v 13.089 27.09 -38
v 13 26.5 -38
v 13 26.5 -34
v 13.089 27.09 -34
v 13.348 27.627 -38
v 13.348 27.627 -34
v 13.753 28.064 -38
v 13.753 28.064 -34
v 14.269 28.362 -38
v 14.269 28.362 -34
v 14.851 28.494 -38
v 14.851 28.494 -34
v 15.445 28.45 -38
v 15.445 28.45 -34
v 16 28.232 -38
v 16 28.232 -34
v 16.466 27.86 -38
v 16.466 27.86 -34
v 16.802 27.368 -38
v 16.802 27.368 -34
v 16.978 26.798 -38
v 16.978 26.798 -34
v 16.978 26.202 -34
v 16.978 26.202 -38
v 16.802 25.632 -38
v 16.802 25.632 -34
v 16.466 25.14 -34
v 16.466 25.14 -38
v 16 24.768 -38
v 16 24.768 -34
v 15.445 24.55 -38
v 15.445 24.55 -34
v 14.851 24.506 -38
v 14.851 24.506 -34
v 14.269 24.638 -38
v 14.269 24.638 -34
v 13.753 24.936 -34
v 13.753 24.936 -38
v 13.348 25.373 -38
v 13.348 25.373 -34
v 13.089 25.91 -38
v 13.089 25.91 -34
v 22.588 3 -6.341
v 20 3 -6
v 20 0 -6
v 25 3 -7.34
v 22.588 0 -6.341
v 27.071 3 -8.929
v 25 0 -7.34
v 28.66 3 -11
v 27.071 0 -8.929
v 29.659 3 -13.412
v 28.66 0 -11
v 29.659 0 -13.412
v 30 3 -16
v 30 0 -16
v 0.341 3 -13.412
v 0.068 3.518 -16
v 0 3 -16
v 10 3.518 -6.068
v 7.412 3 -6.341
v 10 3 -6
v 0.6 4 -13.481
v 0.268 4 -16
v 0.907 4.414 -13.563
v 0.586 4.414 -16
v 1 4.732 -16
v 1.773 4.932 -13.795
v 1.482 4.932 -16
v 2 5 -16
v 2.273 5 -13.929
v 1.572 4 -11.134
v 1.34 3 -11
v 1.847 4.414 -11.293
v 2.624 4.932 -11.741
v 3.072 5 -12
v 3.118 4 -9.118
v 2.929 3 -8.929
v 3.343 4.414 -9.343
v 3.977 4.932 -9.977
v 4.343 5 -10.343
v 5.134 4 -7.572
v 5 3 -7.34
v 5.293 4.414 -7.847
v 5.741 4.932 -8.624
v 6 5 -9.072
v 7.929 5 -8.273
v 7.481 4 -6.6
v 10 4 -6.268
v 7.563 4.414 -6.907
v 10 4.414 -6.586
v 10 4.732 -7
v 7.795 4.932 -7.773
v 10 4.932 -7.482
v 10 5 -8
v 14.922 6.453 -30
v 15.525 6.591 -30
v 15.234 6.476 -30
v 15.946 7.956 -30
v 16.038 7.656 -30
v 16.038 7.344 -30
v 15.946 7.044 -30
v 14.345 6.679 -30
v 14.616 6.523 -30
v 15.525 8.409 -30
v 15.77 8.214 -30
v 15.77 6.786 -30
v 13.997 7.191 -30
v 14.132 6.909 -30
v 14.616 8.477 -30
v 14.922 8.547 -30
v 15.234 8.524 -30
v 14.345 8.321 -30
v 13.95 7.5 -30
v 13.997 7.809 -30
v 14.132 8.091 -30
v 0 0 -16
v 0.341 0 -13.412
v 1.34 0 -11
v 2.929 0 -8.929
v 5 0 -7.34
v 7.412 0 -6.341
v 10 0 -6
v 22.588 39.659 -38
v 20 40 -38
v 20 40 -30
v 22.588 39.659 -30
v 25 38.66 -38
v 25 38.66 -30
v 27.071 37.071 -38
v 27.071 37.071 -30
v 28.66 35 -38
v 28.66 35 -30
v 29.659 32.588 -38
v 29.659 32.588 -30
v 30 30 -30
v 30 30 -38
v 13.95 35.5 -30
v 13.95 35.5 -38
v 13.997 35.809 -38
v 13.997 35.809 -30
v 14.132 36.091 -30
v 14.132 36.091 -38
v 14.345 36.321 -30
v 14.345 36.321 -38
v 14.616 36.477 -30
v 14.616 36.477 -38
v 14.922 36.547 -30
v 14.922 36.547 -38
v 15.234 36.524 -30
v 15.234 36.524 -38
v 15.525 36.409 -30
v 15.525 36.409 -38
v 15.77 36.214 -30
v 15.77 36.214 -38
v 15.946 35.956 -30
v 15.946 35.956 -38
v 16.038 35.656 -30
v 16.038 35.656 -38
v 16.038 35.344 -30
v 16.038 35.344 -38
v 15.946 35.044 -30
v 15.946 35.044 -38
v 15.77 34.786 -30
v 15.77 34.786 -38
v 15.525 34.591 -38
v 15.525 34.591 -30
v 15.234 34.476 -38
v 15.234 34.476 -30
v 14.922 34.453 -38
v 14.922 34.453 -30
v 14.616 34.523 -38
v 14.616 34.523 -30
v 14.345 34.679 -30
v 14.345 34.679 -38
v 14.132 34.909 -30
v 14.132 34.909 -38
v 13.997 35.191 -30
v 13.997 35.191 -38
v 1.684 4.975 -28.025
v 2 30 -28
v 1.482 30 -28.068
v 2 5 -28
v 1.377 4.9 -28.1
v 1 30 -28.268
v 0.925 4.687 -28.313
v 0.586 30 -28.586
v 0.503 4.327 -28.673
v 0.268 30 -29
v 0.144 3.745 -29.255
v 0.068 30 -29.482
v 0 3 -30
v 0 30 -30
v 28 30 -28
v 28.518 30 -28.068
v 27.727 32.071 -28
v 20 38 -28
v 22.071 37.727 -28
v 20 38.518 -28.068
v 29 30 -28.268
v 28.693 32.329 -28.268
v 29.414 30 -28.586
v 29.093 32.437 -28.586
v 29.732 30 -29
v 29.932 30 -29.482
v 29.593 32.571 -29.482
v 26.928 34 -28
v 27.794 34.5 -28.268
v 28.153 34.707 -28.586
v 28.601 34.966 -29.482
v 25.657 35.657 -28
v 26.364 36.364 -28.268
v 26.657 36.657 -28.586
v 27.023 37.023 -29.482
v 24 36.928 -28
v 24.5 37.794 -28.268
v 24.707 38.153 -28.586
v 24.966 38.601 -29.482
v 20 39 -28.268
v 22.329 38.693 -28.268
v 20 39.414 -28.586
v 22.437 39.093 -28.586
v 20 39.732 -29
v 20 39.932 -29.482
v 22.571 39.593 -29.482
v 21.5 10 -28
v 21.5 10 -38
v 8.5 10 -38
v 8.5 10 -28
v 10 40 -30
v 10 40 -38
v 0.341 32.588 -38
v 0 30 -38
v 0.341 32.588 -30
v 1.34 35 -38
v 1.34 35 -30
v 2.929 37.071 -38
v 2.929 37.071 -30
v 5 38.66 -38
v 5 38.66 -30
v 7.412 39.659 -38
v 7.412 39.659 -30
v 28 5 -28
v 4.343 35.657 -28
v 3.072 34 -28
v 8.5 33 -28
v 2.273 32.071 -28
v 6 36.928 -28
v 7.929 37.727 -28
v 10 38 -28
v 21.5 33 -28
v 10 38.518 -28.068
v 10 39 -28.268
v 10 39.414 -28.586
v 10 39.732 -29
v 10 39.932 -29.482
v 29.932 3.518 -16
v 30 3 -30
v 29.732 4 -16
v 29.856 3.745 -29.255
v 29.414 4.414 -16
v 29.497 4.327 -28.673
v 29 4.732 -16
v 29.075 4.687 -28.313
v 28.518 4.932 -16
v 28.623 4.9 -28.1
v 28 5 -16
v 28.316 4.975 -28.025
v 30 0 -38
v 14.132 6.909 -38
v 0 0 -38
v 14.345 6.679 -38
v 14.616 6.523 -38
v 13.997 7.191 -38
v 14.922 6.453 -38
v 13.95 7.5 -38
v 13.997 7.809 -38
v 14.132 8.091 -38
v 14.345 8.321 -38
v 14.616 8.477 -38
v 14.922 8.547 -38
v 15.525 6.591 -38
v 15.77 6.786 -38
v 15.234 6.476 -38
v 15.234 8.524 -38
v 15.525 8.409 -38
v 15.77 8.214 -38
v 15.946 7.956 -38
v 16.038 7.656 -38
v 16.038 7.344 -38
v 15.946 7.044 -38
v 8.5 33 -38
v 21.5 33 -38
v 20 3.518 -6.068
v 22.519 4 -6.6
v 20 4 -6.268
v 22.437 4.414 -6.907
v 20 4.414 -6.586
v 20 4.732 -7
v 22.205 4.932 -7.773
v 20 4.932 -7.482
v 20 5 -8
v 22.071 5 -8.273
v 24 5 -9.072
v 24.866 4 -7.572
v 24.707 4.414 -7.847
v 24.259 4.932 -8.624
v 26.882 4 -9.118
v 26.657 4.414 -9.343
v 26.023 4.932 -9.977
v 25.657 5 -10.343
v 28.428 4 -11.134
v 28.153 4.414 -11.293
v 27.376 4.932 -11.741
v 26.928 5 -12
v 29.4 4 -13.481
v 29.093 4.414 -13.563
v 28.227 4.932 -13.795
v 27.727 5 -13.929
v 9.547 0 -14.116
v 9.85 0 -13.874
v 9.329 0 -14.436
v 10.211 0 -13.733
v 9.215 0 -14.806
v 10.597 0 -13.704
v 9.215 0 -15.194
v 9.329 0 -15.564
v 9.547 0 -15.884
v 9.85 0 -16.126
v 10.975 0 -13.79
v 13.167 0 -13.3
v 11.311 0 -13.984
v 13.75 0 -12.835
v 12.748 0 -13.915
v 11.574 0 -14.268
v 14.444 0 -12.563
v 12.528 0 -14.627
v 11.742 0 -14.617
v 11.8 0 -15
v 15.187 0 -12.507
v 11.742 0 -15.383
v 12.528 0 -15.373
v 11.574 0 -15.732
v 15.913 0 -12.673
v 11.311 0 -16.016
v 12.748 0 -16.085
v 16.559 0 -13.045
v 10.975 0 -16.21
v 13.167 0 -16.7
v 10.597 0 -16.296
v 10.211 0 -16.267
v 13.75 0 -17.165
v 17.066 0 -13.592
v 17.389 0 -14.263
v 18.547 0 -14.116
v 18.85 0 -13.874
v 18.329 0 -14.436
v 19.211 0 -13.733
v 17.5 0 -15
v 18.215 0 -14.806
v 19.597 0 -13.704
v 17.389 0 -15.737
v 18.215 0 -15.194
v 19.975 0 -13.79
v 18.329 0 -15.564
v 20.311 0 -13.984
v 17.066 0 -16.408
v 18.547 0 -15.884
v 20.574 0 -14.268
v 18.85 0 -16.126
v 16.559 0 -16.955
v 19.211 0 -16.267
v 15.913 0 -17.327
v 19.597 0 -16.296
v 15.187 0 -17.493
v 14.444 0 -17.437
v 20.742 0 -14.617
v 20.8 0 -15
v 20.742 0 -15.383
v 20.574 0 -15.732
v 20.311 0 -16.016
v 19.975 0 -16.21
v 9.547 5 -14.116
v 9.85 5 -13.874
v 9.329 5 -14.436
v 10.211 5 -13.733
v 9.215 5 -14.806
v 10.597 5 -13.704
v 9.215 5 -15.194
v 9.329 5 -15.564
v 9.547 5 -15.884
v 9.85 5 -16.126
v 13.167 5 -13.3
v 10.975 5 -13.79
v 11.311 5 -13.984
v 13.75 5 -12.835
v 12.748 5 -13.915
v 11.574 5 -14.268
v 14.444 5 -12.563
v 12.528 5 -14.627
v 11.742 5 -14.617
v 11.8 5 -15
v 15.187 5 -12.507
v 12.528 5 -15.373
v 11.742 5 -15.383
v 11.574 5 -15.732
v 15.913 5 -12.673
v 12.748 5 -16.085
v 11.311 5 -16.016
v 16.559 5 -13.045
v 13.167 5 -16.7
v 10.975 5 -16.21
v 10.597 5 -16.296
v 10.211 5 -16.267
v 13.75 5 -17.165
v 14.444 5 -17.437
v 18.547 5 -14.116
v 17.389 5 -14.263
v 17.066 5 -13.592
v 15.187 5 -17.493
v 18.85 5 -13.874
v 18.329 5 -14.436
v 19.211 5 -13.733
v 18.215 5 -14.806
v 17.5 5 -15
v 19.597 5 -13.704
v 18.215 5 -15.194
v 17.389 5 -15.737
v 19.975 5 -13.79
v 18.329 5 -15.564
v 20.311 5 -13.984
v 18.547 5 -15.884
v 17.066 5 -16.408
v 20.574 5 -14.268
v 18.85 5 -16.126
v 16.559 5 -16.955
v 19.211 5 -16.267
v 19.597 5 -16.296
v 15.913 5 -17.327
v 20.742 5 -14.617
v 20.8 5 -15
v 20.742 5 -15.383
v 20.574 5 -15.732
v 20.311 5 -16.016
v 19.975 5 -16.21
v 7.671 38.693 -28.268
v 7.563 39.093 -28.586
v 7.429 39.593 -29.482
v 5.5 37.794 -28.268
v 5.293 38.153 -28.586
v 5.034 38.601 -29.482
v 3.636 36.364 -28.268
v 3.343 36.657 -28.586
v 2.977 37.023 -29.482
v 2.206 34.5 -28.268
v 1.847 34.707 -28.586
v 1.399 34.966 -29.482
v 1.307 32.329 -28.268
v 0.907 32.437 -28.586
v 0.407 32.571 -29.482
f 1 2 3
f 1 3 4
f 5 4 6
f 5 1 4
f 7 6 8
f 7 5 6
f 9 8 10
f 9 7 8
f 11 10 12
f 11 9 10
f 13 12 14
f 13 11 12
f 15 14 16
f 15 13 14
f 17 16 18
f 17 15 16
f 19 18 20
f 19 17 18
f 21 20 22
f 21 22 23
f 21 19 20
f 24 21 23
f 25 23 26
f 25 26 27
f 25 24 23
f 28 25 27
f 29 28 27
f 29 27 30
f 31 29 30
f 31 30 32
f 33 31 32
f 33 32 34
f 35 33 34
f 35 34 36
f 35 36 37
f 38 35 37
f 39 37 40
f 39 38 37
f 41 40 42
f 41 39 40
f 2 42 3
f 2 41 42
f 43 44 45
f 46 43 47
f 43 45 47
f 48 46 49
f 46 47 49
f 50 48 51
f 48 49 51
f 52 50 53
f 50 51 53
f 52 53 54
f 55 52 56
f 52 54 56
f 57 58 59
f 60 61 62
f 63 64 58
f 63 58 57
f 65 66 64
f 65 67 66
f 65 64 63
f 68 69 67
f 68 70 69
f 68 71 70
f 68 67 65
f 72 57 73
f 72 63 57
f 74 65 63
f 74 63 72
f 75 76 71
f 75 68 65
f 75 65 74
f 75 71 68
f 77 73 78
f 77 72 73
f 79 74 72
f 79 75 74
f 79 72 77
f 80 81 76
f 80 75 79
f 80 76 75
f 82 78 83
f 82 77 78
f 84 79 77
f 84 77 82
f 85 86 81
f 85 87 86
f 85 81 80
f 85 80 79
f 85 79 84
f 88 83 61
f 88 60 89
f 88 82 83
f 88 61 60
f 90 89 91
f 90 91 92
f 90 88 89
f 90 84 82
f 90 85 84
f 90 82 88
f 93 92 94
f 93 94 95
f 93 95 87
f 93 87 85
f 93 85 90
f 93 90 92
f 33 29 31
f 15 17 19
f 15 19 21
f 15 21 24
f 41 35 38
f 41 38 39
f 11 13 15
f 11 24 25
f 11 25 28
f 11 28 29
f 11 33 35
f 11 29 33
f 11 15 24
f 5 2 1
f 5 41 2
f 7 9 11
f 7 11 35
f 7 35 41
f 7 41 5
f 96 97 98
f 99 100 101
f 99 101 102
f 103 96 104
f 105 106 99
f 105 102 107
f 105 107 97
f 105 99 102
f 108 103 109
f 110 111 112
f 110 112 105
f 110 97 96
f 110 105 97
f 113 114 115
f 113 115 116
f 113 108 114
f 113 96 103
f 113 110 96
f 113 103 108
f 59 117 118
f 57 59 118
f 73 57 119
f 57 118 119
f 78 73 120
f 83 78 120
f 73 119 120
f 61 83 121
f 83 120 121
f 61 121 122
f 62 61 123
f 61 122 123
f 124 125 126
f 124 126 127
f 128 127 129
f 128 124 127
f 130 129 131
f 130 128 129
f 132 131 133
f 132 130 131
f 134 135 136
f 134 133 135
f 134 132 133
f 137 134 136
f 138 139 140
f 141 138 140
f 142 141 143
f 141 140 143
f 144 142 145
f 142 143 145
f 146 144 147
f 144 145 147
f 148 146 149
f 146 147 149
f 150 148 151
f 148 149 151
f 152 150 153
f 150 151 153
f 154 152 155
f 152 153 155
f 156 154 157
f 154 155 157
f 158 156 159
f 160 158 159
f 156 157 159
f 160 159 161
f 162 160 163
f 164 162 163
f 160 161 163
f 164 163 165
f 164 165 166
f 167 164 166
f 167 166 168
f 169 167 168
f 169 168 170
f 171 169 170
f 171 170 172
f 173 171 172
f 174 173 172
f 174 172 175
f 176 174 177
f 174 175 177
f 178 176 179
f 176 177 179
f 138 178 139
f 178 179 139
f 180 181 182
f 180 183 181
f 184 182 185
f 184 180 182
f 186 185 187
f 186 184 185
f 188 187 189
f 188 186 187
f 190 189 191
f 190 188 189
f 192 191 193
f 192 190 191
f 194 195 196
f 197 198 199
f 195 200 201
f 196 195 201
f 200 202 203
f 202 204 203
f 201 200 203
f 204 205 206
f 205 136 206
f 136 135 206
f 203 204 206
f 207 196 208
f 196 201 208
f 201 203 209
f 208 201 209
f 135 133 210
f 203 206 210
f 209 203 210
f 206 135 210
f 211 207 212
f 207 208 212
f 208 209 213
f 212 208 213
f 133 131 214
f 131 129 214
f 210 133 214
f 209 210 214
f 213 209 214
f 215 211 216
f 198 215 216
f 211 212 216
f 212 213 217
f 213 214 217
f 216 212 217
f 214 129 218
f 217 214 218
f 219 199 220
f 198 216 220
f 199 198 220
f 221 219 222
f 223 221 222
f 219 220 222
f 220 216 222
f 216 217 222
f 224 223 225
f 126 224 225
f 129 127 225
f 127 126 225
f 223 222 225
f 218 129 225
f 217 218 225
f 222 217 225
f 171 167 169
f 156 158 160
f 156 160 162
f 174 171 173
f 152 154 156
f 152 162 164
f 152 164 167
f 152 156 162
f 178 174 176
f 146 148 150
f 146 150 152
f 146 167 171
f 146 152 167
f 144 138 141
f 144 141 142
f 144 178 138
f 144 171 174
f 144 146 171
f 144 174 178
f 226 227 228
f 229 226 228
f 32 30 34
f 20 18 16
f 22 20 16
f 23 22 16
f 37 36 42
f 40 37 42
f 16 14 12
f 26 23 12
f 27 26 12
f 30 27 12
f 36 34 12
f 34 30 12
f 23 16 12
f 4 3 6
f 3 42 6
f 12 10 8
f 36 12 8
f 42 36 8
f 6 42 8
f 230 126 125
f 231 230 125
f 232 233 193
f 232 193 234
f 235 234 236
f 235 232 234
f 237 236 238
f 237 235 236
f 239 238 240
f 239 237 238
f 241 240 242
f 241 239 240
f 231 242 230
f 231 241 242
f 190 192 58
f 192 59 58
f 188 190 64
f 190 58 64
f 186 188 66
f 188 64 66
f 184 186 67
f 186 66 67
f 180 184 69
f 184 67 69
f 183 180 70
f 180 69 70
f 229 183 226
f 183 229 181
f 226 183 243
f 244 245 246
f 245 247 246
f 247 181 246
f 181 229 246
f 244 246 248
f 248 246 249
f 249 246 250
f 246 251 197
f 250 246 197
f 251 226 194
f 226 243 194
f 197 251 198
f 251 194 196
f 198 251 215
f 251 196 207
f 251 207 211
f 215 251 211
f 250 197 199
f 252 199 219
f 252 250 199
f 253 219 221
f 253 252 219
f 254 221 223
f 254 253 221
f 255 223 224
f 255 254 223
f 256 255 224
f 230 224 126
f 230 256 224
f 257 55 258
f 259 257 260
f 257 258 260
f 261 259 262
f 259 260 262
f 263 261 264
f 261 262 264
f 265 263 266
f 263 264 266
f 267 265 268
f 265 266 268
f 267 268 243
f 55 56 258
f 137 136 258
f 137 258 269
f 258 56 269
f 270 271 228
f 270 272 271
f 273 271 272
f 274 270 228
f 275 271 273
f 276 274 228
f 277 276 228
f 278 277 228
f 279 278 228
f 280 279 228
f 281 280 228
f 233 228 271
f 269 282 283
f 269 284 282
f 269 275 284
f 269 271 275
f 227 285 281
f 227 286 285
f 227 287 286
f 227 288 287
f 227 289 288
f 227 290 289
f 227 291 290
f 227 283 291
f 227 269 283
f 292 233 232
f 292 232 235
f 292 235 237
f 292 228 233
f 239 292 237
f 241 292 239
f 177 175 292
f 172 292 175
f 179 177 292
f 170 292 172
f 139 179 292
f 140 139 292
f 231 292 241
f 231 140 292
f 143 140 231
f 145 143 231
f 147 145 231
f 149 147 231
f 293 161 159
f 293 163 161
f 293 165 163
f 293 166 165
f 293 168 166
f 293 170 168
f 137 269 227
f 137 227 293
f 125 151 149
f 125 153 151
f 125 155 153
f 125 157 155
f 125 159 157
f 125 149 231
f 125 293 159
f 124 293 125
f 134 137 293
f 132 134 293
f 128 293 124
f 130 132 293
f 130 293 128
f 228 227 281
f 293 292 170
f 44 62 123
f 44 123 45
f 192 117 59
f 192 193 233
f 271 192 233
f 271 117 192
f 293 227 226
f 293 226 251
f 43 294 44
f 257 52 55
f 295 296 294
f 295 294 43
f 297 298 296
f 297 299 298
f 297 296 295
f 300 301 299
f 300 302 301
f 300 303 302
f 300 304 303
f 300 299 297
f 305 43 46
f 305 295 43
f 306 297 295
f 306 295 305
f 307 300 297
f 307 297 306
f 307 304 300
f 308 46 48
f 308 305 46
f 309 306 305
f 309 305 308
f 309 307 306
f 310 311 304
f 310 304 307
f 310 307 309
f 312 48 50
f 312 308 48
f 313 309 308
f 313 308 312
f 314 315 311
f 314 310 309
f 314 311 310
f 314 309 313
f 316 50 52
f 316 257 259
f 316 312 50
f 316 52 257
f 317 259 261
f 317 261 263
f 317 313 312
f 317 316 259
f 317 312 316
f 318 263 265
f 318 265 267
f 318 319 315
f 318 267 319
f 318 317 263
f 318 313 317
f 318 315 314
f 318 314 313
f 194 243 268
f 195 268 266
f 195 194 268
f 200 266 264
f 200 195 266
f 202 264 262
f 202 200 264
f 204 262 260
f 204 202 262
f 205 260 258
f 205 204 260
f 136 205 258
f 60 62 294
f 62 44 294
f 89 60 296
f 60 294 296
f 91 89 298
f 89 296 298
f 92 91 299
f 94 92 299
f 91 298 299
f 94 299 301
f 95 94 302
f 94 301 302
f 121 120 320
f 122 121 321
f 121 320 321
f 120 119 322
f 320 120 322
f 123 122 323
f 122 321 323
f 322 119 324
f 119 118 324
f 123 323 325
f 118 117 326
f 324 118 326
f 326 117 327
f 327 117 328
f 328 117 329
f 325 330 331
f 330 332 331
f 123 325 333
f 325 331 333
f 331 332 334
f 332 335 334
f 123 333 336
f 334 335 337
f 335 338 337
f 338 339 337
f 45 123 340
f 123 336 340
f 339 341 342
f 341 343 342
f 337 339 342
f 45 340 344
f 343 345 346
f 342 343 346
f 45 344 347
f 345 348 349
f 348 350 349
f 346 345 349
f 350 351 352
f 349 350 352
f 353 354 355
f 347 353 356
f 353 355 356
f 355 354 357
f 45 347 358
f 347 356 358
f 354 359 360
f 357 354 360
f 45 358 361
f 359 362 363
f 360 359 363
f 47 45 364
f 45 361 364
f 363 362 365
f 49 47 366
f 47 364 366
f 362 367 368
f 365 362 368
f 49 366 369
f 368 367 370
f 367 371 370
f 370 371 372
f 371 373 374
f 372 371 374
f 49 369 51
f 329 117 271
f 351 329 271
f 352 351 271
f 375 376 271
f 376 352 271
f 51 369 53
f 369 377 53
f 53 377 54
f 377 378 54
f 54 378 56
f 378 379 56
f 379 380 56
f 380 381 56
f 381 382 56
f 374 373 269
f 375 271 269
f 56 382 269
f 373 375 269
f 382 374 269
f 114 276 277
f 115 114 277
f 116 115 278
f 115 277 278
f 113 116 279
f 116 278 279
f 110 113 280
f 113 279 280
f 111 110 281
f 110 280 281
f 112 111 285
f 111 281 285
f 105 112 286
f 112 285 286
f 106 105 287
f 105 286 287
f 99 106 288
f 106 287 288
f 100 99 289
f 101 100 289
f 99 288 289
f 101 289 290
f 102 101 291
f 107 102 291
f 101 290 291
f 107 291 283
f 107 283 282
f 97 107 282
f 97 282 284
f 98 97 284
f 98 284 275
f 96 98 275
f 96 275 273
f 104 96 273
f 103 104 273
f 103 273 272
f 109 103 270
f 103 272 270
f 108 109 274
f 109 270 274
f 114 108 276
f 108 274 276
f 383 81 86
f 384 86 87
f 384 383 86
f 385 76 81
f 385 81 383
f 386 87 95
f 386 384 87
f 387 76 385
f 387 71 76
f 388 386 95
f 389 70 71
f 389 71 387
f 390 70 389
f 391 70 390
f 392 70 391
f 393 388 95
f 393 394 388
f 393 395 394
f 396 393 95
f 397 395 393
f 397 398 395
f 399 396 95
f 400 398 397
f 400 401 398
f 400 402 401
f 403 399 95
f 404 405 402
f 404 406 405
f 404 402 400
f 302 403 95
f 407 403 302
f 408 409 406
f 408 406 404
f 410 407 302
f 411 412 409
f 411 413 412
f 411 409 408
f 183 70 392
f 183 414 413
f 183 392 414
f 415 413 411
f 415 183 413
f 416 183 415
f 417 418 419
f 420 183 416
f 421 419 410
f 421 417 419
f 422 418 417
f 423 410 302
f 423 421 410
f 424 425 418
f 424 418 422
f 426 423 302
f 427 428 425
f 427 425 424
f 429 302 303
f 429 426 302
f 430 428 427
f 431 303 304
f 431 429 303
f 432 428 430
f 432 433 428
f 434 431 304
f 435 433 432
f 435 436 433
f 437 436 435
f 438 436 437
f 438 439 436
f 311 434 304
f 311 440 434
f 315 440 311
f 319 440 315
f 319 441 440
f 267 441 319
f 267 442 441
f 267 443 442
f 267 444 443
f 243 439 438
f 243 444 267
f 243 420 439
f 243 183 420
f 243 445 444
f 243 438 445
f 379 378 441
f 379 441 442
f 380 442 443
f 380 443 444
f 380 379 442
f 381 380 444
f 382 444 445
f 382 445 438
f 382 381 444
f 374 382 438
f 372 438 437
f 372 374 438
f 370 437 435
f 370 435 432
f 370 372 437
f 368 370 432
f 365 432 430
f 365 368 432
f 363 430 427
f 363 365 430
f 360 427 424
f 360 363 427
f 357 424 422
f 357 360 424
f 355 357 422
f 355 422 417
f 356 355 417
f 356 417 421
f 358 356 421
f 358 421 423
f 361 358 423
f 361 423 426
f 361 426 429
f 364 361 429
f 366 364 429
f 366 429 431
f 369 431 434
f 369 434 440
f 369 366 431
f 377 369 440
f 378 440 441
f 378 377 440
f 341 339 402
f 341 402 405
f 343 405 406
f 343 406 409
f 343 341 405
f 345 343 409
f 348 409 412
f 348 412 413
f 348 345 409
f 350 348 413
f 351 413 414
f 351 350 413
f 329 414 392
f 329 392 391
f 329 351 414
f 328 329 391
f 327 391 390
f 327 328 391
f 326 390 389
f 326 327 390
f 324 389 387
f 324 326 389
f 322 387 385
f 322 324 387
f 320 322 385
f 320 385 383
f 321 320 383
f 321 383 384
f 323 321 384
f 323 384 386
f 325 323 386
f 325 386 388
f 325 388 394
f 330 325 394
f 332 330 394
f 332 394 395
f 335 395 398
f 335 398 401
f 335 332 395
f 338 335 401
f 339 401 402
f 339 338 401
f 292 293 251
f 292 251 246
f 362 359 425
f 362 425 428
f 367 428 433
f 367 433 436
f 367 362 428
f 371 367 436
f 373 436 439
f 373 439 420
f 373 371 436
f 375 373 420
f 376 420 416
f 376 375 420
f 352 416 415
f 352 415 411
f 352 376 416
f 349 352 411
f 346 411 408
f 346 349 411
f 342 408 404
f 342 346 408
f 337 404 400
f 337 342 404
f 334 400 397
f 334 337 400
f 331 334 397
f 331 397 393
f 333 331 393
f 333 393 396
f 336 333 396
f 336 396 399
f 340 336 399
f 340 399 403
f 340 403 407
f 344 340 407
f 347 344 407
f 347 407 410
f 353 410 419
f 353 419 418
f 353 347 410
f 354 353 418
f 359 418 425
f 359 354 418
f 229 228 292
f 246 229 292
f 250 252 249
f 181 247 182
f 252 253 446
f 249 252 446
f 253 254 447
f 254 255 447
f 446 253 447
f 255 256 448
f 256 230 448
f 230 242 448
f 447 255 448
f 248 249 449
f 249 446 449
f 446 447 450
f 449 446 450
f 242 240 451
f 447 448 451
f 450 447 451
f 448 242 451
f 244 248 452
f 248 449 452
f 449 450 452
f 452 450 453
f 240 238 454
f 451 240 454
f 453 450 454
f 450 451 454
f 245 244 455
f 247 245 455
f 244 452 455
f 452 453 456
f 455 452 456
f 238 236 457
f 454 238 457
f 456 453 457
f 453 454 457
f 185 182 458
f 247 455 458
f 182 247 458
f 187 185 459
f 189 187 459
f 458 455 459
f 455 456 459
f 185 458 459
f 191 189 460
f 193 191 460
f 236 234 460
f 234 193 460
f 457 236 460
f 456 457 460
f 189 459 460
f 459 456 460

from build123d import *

# Parameters (mm, degrees)
SKETCH1_W           = 30
SKETCH1_H           = 30
SKETCH1_R           = 1.3
SKETCH1_R_2         = 2.5
BOSS_EXTRUDE1_DEPTH = 5
SKETCH2_W           = 10
SKETCH2_H           = 40
BOSS_EXTRUDE2_DEPTH = 30
SKETCH3_W           = 13
SKETCH3_H           = 23
CUT_EXTRUDE1_DEPTH  = 39
SKETCH3_3_R         = 1.05
CUT_EXTRUDE2_DEPTH  = 8
SKETCH3_6_R         = 2
BOSS_EXTRUDE3_DEPTH = 4
SKETCH5_W           = 30
SKETCH5_H           = 6
CUT_EXTRUDE4_DEPTH  = 5
FILLET4_R           = 10
FILLET5_R           = 2


with BuildPart() as part:
    # Sketch1 → Boss-Extrude1 (new body)
    with BuildSketch(Plane(origin=(0, 0, 0), x_dir=(1, 0, 0), z_dir=(0, 1, 0))):
        with Locations((15, 15)):
            Rectangle(SKETCH1_W, SKETCH1_H)
        with Locations((19.5, 15)):
            Circle(SKETCH1_R, mode=Mode.SUBTRACT)
        with Locations((10.5, 15)):
            Circle(SKETCH1_R, mode=Mode.SUBTRACT)
        with Locations((15, 15)):
            Circle(SKETCH1_R_2, mode=Mode.SUBTRACT)
    extrude(amount=BOSS_EXTRUDE1_DEPTH)

    # Sketch2 → Boss-Extrude2 (add)
    with BuildSketch(Plane(origin=(30, 0, 0), x_dir=(0, 0, -1), z_dir=(1, 0, 0))):
        with Locations((33, 20)):
            Rectangle(SKETCH2_W, SKETCH2_H)
    extrude(amount=-BOSS_EXTRUDE2_DEPTH)

    # Sketch3 → Cut-Extrude1 (cut, through all)
    with BuildSketch(Plane(origin=(0, 0, -38), x_dir=(-1, 0, 0), z_dir=(0, 0, -1))):
        with Locations((-15, 21.5)):
            Rectangle(SKETCH3_W, SKETCH3_H)
    extrude(amount=-CUT_EXTRUDE1_DEPTH, mode=Mode.SUBTRACT)

    # Sketch3<3> → Cut-Extrude2 (cut)
    with BuildSketch(Plane(origin=(0, 0, -38), x_dir=(-1, 0, 0), z_dir=(0, 0, -1))):
        with Locations((-15, 35.5)):
            Circle(SKETCH3_3_R)
        with Locations((-15, 7.5)):
            Circle(SKETCH3_3_R)
    extrude(amount=-CUT_EXTRUDE2_DEPTH, mode=Mode.SUBTRACT)

    # Sketch5 → Cut-Extrude4 (cut)
    with BuildSketch(Plane(origin=(0, 5, 0), x_dir=(1, 0, 0), z_dir=(0, 1, 0))):
        with Locations((15, 3)):
            Rectangle(SKETCH5_W, SKETCH5_H)
    extrude(amount=-CUT_EXTRUDE4_DEPTH, mode=Mode.SUBTRACT)

    # Fillet4
    fillet4_edges = [part.edges().sort_by_distance(p)[0] for p in [
        (30, 40, -33),
        (0, 40, -33),
        (0, 2.5, -6),
        (30, 2.5, -6),
    ]]
    fillet(fillet4_edges, radius=FILLET4_R)

    # Fillet5
    fillet5_edges = [part.edges().sort_by_distance(p)[0] for p in [
        (2.928932188, 5, -8.928932188),
        (15, 40, -28),
        (0, 17.5, -28),
        (30, 17.5, -28),
        (27.071067812, 37.071067812, -28),
        (2.928932188, 37.071067812, -28),
        (0, 5, -22),
        (30, 5, -22),
        (15, 5, -6),
        (27.071067812, 5, -8.928932188),
    ]]
    fillet(fillet5_edges, radius=FILLET5_R)


with BuildPart() as body_2:
    # Sketch3<6> → Boss-Extrude3 (new body)
    with BuildSketch(Plane(origin=(0, 0, -38), x_dir=(-1, 0, 0), z_dir=(0, 0, -1))):
        with Locations((-15, 26.5)):
            Circle(SKETCH3_6_R)
    extrude(amount=-BOSS_EXTRUDE3_DEPTH)


solid = Compound([part.part, body_2.part])
